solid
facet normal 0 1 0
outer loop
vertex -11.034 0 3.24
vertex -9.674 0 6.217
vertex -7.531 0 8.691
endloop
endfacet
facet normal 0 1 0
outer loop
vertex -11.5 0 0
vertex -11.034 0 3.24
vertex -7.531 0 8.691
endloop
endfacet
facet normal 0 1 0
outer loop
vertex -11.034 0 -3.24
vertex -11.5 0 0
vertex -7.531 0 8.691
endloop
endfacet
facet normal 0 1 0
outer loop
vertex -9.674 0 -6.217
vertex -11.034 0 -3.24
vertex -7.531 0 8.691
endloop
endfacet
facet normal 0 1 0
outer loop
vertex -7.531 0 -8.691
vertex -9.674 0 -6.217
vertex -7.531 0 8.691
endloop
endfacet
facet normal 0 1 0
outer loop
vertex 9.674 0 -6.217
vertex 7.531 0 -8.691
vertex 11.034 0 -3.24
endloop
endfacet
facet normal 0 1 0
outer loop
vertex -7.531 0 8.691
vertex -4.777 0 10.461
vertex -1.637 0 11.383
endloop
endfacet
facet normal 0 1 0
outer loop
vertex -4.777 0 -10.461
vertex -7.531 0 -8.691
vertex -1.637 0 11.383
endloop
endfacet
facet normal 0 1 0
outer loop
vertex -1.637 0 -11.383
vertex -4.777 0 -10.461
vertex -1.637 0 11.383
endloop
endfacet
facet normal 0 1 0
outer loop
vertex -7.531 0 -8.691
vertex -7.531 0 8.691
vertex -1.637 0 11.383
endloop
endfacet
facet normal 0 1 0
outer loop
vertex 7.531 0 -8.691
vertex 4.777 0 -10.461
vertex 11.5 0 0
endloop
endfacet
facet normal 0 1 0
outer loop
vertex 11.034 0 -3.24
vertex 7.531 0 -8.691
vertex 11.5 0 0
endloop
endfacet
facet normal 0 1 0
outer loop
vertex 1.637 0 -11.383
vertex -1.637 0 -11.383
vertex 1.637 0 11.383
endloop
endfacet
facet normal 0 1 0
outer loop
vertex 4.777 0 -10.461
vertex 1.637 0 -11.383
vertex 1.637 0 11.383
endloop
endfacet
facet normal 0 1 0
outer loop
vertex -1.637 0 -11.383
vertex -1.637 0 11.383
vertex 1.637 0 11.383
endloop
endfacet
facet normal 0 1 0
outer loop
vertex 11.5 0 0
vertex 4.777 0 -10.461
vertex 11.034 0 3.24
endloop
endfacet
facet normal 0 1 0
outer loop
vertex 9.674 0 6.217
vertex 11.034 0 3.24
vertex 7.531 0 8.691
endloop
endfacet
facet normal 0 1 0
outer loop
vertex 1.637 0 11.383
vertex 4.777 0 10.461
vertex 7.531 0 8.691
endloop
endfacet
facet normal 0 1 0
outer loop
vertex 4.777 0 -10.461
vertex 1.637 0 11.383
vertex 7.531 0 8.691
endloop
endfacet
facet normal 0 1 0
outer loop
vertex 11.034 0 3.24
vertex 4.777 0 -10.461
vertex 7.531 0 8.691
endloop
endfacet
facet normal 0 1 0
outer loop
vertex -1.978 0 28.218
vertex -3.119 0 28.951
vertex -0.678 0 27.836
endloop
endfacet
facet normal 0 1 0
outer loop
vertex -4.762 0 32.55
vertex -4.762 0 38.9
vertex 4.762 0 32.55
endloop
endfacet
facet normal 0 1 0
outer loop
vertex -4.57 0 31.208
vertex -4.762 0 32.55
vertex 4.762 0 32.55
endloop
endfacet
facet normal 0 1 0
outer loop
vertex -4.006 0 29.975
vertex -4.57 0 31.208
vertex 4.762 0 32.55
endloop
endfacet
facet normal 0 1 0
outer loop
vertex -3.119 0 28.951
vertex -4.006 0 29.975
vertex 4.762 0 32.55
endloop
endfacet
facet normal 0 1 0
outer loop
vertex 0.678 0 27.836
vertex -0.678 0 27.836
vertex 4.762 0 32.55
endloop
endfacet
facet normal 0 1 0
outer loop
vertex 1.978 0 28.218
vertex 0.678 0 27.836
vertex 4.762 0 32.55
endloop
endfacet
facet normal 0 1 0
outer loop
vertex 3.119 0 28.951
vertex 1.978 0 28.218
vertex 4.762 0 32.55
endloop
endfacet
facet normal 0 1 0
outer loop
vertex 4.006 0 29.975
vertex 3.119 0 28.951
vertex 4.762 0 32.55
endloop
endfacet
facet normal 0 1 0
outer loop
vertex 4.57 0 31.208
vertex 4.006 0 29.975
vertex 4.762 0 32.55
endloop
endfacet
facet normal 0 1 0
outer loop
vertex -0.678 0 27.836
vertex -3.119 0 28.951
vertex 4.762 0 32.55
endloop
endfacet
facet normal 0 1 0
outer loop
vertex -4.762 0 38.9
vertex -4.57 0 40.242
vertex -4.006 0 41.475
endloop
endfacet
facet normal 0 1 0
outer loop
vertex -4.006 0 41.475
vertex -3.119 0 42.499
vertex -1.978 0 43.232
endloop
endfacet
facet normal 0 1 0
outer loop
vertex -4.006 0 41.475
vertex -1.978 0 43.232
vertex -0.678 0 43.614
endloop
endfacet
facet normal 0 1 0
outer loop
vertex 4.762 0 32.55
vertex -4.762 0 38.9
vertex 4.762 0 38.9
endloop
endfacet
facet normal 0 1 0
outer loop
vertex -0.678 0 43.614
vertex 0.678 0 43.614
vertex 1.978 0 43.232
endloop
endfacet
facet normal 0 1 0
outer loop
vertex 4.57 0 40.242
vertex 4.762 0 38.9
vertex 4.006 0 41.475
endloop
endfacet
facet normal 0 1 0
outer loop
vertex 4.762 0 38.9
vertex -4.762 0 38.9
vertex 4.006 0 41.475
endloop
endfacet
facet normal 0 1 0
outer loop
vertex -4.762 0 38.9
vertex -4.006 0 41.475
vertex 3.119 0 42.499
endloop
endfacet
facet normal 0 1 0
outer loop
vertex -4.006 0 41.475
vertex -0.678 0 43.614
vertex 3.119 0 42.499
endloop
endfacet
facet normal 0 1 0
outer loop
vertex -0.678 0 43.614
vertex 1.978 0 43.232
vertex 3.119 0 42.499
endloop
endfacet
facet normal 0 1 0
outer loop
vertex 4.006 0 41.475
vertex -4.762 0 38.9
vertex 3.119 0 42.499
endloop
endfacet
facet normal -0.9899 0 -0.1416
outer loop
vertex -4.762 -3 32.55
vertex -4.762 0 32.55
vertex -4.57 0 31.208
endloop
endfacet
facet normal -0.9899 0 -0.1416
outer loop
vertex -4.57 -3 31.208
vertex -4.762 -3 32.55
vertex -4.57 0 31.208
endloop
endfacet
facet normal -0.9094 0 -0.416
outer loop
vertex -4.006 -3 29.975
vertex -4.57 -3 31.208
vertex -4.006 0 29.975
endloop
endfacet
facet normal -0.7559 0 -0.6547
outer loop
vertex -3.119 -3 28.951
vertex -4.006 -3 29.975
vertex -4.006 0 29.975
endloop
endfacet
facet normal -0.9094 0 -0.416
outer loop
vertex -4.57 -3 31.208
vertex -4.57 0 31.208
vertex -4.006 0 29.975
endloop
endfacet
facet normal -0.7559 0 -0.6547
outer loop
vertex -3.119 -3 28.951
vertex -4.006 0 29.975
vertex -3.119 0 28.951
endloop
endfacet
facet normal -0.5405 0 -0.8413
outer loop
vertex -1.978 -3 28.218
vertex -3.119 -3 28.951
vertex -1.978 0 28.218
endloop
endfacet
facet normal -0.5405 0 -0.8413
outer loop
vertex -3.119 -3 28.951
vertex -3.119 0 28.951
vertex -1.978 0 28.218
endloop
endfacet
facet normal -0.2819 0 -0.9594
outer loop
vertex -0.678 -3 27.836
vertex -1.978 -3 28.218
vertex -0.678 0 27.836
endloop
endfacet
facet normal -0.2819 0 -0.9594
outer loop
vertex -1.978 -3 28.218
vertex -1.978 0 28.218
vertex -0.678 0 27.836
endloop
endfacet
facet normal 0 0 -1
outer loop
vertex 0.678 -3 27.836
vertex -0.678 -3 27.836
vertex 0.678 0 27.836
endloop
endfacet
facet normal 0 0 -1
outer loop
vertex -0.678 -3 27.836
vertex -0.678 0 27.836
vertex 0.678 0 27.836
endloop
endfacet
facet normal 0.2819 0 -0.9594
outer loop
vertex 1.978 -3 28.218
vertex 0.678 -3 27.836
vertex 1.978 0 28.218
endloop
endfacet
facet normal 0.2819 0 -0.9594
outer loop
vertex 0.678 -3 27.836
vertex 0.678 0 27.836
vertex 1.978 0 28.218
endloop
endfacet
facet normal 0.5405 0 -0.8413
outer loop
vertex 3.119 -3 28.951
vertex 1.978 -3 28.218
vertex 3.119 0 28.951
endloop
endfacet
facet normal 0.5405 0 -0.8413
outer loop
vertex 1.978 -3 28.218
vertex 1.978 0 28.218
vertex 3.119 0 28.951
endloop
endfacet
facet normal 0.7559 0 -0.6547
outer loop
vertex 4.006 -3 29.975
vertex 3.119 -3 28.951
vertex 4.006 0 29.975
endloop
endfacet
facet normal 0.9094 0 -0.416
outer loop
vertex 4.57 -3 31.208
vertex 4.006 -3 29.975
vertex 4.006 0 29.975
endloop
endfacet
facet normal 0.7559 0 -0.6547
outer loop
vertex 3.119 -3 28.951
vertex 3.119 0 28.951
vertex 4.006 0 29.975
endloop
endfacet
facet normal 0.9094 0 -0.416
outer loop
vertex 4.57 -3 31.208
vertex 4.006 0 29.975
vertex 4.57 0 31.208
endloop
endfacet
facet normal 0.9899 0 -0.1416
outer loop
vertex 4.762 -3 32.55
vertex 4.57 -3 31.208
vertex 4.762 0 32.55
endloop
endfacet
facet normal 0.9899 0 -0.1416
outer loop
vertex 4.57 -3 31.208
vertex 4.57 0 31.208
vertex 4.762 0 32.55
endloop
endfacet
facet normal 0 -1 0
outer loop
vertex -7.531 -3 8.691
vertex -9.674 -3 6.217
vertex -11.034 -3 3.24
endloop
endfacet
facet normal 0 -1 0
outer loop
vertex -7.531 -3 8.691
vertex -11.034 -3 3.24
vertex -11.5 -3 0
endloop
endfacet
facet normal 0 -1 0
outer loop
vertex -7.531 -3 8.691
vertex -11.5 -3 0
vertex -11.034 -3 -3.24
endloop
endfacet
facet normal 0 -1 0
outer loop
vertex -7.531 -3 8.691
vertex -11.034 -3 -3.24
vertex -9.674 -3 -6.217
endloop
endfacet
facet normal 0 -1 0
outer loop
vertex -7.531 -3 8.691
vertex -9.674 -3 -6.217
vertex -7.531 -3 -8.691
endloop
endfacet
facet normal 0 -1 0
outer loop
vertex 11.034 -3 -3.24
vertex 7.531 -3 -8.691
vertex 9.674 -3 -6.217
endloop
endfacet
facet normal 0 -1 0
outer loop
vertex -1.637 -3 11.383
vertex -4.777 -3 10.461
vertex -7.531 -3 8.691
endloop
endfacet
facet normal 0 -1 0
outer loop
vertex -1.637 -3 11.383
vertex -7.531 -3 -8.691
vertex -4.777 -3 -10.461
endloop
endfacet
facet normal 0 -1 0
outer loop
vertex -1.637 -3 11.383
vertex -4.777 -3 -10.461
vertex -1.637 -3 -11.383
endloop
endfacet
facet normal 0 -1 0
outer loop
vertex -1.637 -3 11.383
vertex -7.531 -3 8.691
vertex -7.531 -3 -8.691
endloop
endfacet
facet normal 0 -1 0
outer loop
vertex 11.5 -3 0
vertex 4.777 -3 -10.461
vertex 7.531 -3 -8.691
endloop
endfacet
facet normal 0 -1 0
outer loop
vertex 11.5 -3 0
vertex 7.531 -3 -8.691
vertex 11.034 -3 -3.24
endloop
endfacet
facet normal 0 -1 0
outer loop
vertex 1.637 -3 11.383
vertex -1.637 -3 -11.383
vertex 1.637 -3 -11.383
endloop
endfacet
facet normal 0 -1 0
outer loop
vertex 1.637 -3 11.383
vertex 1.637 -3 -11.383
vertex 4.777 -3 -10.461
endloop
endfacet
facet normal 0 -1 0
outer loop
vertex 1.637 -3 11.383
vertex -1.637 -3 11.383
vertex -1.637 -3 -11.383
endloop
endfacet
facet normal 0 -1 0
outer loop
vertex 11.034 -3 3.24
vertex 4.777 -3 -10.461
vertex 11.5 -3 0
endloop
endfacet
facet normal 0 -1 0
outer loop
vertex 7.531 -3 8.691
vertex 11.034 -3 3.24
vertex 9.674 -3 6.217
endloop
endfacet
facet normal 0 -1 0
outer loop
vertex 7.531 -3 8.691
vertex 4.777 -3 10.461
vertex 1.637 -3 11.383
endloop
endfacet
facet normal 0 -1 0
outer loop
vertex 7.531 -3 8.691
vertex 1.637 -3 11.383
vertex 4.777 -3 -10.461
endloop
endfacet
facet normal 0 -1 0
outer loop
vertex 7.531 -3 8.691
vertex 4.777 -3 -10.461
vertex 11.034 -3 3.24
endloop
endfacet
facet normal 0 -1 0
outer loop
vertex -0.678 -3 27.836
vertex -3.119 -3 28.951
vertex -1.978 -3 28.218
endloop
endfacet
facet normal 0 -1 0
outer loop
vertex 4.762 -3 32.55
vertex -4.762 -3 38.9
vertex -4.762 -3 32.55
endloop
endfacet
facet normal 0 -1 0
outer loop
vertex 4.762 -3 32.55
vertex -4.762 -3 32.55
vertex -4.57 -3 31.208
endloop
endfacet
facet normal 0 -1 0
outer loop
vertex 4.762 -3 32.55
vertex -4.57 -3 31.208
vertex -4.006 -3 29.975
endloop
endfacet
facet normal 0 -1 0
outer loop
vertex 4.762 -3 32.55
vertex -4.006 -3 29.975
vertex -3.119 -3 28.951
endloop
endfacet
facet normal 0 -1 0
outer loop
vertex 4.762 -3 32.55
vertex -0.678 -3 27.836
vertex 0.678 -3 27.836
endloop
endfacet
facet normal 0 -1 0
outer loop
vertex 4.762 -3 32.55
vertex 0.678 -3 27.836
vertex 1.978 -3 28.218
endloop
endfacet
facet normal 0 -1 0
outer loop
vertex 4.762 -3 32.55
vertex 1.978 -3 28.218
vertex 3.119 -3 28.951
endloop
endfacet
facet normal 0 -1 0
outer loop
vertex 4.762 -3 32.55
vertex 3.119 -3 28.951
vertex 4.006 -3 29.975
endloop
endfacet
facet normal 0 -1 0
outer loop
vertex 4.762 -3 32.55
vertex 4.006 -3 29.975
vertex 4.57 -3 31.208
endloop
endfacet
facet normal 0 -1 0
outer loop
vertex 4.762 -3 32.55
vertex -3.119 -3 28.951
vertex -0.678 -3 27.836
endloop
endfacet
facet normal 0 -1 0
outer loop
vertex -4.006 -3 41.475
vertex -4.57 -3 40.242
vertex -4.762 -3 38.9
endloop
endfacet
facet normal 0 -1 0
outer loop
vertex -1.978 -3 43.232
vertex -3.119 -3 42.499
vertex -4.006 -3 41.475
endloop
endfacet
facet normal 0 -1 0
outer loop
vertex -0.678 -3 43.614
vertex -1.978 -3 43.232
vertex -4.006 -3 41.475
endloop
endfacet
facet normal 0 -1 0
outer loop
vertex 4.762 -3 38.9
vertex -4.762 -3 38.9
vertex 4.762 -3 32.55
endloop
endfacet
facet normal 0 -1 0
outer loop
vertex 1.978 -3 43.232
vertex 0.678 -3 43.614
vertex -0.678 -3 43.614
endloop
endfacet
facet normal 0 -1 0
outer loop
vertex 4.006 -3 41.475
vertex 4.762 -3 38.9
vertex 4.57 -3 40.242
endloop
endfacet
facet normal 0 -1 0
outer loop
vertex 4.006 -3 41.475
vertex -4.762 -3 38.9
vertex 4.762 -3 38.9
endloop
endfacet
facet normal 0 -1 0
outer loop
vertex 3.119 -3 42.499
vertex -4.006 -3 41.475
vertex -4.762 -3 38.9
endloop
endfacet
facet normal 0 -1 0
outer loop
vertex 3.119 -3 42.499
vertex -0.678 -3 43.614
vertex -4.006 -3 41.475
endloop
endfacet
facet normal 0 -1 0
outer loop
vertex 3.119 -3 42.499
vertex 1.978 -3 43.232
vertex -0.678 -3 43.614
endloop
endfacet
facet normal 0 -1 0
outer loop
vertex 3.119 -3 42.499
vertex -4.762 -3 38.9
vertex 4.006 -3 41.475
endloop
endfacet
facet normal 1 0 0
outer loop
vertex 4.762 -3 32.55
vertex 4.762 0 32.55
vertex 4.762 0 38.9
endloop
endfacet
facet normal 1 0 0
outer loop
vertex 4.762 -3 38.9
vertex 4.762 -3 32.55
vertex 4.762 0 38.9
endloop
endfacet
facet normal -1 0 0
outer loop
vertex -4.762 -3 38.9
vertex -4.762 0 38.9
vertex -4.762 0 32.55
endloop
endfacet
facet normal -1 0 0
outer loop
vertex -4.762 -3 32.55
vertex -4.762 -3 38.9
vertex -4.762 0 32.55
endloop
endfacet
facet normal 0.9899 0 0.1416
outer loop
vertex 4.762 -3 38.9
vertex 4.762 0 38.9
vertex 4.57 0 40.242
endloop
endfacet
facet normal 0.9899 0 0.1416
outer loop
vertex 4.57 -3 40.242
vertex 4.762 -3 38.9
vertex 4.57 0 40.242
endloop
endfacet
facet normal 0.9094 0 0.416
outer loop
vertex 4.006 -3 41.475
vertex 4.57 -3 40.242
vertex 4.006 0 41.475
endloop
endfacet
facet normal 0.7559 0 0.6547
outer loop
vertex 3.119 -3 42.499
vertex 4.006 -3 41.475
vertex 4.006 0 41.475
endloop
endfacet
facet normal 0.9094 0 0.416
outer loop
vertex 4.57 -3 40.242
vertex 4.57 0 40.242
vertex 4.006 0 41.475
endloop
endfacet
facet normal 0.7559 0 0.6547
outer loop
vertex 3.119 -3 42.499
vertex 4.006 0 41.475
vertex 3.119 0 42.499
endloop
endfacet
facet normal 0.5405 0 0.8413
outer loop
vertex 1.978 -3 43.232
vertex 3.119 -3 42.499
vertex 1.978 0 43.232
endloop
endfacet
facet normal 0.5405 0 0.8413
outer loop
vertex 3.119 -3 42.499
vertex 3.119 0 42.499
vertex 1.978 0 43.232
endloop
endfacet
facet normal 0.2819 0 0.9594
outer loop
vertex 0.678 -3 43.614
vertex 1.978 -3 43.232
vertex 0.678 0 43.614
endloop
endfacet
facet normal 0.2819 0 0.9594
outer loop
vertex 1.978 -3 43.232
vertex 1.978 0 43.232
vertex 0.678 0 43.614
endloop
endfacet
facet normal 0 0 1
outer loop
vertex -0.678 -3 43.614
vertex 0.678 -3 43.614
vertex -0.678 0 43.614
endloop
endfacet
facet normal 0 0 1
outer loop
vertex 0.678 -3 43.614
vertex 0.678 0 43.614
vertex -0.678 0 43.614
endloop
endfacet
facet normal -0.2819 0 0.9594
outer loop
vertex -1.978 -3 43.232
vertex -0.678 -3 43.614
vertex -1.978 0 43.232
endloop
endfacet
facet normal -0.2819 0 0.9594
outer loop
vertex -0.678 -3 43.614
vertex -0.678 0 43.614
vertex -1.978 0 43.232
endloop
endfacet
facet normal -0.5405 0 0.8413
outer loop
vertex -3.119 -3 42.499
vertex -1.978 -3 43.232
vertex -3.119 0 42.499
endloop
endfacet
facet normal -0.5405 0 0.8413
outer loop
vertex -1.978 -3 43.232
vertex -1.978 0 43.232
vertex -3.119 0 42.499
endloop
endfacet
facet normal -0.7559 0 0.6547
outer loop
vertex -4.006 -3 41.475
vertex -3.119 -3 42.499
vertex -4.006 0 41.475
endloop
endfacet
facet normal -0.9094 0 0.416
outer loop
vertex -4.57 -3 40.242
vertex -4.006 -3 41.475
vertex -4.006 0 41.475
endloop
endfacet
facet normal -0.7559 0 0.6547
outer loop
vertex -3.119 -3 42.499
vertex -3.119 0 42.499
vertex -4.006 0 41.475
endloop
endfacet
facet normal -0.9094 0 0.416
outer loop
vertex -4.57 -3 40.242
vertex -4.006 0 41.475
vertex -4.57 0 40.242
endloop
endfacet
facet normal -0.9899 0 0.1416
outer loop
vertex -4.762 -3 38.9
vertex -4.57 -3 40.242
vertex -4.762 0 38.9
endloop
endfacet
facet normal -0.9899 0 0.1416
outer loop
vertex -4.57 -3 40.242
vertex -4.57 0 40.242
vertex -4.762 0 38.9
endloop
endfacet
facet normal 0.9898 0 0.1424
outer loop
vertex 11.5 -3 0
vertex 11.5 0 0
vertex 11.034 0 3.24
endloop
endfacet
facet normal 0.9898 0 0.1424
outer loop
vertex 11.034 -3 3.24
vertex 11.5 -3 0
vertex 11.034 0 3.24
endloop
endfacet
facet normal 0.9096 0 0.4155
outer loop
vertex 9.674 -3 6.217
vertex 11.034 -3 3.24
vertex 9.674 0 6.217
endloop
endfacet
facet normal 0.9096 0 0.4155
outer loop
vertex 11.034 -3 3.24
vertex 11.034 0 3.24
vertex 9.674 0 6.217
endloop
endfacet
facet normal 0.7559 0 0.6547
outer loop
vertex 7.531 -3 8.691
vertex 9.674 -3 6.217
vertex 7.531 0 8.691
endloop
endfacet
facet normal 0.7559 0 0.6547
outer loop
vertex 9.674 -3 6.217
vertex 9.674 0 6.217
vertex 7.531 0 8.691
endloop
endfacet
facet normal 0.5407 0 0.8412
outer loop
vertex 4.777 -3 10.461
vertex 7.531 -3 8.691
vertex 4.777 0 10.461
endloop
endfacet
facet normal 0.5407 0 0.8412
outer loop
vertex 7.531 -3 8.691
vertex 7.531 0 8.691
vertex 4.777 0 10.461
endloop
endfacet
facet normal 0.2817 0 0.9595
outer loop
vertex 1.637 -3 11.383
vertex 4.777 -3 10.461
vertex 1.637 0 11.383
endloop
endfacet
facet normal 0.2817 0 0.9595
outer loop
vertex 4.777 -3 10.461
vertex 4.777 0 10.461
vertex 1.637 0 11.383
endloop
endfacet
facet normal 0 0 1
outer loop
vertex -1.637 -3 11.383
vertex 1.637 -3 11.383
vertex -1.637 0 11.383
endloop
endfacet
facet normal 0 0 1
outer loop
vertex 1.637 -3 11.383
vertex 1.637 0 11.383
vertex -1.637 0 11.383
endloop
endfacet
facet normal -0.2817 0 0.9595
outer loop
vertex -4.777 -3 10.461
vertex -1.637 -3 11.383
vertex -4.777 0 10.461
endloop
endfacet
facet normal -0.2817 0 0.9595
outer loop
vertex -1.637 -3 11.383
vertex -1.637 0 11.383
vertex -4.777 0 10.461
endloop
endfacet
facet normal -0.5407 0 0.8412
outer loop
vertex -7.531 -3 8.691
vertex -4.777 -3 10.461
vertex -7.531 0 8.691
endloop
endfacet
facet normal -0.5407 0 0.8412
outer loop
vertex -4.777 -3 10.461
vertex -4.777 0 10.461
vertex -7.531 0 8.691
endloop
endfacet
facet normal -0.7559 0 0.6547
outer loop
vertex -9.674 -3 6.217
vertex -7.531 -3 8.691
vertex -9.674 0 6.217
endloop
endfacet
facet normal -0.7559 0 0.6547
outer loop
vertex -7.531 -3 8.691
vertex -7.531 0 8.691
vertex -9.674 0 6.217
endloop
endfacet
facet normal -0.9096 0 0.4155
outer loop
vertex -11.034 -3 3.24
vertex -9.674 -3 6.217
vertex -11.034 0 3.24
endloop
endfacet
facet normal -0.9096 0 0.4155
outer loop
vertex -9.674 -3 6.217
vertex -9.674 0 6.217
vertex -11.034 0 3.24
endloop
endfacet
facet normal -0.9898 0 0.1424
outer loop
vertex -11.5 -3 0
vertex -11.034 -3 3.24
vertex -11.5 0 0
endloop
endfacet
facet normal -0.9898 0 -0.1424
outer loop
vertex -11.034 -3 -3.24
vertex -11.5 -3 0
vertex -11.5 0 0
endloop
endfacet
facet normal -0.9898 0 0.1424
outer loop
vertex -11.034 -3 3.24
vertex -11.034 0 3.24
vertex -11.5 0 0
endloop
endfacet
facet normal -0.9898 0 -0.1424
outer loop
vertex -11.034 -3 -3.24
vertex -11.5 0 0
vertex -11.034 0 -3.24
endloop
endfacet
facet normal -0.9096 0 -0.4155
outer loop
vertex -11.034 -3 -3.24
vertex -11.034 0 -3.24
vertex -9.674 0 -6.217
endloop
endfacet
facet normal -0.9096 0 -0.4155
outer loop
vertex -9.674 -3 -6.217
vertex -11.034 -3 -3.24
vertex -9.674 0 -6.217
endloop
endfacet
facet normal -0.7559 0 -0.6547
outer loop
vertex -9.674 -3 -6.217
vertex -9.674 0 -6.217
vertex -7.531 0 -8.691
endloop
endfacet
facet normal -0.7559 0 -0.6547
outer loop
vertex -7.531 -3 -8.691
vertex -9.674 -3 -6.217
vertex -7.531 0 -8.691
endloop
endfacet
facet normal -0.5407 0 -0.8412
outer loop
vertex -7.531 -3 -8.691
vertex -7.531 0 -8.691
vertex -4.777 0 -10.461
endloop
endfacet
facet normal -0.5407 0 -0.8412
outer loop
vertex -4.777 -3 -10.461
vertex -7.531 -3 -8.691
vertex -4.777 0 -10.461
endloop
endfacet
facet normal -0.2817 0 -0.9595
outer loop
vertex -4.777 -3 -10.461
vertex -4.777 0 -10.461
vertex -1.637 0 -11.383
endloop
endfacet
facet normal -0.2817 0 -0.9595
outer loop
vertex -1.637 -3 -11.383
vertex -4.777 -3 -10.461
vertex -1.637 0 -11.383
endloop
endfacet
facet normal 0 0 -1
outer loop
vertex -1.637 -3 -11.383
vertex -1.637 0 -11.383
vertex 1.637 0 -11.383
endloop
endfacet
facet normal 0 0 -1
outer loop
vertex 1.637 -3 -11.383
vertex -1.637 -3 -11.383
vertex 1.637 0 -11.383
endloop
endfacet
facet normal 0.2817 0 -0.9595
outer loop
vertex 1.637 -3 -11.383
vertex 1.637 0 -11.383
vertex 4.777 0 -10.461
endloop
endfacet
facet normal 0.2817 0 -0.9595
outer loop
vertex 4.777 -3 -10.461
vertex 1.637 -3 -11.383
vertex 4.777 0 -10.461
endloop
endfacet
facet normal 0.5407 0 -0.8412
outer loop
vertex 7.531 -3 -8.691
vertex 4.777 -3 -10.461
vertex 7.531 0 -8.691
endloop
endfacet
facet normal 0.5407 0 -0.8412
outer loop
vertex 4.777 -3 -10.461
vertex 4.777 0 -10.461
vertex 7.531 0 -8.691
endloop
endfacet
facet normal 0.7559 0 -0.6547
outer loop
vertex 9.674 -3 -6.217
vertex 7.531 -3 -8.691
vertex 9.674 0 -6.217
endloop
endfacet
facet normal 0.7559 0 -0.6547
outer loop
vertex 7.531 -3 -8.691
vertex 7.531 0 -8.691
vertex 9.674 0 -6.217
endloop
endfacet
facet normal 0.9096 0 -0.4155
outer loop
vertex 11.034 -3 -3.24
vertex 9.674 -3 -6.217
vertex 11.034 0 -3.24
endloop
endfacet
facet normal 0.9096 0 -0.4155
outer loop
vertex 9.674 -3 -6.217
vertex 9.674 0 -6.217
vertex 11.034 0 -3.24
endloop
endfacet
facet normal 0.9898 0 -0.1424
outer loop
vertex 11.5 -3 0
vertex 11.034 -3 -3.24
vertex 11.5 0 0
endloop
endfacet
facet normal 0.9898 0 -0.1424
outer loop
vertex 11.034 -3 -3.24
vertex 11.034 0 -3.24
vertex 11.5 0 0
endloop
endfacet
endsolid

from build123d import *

# Parameters (mm, degrees)
F0_R     = 11.5
F1_DEPTH = 3
F3_DEPTH = 3.001
F4_R     = 1.25
F5_DEPTH = 3.001


with BuildPart() as f1:
    # F0 (on Front) → F1 (new body)
    with BuildSketch(Plane.XZ):
        Circle(F0_R)
        with BuildLine():
            Line((-4.7625, 38.9001), (-4.7625, 32.5501))
            ThreePointArc((-4.7625, 32.5501), (0, 27.7876), (4.7625, 32.5501))
            Line((4.7625, 32.5501), (4.7625, 38.9001))
            ThreePointArc((4.7625, 38.9001), (0, 43.6626), (-4.7625, 38.9001))
        make_face()
    extrude(amount=F1_DEPTH)

    # F2 (on face) → F3 (cut, through all)
    with BuildSketch(Plane.XZ.offset(3)):
        with BuildLine():
            Line((-10.9125, 32.5501), (-10.9125, 38.4502))
            ThreePointArc((-10.9125, 38.4502), (-12.5, 40.0377), (-14.0875, 38.4502))
            Line((-14.0875, 38.4502), (-14.0875, 32.5501))
            ThreePointArc((-14.0875, 32.5501), (-12.5, 30.9626), (-10.9125, 32.5501))
        make_face()
        with BuildLine():
            ThreePointArc((14.0875, 38.4502), (12.5, 40.0377), (10.9125, 38.4502))
            Line((10.9125, 38.4502), (10.9125, 32.5501))
            ThreePointArc((10.9125, 32.5501), (12.5, 30.9626), (14.0875, 32.5501))
            Line((14.0875, 32.5501), (14.0875, 38.4502))
        make_face()
    extrude(amount=-F3_DEPTH, mode=Mode.SUBTRACT)

    # F4 (on face) → F5 (cut, through all)
    with BuildSketch(Plane.XZ.offset(3)):
        with Locations((0, 15)):
            Circle(F4_R)
        with Locations((-24.5, -15)):
            Circle(F4_R)
        with Locations((24.5, -15)):
            Circle(F4_R)
    extrude(amount=-F5_DEPTH, mode=Mode.SUBTRACT)


solid = f1.part
